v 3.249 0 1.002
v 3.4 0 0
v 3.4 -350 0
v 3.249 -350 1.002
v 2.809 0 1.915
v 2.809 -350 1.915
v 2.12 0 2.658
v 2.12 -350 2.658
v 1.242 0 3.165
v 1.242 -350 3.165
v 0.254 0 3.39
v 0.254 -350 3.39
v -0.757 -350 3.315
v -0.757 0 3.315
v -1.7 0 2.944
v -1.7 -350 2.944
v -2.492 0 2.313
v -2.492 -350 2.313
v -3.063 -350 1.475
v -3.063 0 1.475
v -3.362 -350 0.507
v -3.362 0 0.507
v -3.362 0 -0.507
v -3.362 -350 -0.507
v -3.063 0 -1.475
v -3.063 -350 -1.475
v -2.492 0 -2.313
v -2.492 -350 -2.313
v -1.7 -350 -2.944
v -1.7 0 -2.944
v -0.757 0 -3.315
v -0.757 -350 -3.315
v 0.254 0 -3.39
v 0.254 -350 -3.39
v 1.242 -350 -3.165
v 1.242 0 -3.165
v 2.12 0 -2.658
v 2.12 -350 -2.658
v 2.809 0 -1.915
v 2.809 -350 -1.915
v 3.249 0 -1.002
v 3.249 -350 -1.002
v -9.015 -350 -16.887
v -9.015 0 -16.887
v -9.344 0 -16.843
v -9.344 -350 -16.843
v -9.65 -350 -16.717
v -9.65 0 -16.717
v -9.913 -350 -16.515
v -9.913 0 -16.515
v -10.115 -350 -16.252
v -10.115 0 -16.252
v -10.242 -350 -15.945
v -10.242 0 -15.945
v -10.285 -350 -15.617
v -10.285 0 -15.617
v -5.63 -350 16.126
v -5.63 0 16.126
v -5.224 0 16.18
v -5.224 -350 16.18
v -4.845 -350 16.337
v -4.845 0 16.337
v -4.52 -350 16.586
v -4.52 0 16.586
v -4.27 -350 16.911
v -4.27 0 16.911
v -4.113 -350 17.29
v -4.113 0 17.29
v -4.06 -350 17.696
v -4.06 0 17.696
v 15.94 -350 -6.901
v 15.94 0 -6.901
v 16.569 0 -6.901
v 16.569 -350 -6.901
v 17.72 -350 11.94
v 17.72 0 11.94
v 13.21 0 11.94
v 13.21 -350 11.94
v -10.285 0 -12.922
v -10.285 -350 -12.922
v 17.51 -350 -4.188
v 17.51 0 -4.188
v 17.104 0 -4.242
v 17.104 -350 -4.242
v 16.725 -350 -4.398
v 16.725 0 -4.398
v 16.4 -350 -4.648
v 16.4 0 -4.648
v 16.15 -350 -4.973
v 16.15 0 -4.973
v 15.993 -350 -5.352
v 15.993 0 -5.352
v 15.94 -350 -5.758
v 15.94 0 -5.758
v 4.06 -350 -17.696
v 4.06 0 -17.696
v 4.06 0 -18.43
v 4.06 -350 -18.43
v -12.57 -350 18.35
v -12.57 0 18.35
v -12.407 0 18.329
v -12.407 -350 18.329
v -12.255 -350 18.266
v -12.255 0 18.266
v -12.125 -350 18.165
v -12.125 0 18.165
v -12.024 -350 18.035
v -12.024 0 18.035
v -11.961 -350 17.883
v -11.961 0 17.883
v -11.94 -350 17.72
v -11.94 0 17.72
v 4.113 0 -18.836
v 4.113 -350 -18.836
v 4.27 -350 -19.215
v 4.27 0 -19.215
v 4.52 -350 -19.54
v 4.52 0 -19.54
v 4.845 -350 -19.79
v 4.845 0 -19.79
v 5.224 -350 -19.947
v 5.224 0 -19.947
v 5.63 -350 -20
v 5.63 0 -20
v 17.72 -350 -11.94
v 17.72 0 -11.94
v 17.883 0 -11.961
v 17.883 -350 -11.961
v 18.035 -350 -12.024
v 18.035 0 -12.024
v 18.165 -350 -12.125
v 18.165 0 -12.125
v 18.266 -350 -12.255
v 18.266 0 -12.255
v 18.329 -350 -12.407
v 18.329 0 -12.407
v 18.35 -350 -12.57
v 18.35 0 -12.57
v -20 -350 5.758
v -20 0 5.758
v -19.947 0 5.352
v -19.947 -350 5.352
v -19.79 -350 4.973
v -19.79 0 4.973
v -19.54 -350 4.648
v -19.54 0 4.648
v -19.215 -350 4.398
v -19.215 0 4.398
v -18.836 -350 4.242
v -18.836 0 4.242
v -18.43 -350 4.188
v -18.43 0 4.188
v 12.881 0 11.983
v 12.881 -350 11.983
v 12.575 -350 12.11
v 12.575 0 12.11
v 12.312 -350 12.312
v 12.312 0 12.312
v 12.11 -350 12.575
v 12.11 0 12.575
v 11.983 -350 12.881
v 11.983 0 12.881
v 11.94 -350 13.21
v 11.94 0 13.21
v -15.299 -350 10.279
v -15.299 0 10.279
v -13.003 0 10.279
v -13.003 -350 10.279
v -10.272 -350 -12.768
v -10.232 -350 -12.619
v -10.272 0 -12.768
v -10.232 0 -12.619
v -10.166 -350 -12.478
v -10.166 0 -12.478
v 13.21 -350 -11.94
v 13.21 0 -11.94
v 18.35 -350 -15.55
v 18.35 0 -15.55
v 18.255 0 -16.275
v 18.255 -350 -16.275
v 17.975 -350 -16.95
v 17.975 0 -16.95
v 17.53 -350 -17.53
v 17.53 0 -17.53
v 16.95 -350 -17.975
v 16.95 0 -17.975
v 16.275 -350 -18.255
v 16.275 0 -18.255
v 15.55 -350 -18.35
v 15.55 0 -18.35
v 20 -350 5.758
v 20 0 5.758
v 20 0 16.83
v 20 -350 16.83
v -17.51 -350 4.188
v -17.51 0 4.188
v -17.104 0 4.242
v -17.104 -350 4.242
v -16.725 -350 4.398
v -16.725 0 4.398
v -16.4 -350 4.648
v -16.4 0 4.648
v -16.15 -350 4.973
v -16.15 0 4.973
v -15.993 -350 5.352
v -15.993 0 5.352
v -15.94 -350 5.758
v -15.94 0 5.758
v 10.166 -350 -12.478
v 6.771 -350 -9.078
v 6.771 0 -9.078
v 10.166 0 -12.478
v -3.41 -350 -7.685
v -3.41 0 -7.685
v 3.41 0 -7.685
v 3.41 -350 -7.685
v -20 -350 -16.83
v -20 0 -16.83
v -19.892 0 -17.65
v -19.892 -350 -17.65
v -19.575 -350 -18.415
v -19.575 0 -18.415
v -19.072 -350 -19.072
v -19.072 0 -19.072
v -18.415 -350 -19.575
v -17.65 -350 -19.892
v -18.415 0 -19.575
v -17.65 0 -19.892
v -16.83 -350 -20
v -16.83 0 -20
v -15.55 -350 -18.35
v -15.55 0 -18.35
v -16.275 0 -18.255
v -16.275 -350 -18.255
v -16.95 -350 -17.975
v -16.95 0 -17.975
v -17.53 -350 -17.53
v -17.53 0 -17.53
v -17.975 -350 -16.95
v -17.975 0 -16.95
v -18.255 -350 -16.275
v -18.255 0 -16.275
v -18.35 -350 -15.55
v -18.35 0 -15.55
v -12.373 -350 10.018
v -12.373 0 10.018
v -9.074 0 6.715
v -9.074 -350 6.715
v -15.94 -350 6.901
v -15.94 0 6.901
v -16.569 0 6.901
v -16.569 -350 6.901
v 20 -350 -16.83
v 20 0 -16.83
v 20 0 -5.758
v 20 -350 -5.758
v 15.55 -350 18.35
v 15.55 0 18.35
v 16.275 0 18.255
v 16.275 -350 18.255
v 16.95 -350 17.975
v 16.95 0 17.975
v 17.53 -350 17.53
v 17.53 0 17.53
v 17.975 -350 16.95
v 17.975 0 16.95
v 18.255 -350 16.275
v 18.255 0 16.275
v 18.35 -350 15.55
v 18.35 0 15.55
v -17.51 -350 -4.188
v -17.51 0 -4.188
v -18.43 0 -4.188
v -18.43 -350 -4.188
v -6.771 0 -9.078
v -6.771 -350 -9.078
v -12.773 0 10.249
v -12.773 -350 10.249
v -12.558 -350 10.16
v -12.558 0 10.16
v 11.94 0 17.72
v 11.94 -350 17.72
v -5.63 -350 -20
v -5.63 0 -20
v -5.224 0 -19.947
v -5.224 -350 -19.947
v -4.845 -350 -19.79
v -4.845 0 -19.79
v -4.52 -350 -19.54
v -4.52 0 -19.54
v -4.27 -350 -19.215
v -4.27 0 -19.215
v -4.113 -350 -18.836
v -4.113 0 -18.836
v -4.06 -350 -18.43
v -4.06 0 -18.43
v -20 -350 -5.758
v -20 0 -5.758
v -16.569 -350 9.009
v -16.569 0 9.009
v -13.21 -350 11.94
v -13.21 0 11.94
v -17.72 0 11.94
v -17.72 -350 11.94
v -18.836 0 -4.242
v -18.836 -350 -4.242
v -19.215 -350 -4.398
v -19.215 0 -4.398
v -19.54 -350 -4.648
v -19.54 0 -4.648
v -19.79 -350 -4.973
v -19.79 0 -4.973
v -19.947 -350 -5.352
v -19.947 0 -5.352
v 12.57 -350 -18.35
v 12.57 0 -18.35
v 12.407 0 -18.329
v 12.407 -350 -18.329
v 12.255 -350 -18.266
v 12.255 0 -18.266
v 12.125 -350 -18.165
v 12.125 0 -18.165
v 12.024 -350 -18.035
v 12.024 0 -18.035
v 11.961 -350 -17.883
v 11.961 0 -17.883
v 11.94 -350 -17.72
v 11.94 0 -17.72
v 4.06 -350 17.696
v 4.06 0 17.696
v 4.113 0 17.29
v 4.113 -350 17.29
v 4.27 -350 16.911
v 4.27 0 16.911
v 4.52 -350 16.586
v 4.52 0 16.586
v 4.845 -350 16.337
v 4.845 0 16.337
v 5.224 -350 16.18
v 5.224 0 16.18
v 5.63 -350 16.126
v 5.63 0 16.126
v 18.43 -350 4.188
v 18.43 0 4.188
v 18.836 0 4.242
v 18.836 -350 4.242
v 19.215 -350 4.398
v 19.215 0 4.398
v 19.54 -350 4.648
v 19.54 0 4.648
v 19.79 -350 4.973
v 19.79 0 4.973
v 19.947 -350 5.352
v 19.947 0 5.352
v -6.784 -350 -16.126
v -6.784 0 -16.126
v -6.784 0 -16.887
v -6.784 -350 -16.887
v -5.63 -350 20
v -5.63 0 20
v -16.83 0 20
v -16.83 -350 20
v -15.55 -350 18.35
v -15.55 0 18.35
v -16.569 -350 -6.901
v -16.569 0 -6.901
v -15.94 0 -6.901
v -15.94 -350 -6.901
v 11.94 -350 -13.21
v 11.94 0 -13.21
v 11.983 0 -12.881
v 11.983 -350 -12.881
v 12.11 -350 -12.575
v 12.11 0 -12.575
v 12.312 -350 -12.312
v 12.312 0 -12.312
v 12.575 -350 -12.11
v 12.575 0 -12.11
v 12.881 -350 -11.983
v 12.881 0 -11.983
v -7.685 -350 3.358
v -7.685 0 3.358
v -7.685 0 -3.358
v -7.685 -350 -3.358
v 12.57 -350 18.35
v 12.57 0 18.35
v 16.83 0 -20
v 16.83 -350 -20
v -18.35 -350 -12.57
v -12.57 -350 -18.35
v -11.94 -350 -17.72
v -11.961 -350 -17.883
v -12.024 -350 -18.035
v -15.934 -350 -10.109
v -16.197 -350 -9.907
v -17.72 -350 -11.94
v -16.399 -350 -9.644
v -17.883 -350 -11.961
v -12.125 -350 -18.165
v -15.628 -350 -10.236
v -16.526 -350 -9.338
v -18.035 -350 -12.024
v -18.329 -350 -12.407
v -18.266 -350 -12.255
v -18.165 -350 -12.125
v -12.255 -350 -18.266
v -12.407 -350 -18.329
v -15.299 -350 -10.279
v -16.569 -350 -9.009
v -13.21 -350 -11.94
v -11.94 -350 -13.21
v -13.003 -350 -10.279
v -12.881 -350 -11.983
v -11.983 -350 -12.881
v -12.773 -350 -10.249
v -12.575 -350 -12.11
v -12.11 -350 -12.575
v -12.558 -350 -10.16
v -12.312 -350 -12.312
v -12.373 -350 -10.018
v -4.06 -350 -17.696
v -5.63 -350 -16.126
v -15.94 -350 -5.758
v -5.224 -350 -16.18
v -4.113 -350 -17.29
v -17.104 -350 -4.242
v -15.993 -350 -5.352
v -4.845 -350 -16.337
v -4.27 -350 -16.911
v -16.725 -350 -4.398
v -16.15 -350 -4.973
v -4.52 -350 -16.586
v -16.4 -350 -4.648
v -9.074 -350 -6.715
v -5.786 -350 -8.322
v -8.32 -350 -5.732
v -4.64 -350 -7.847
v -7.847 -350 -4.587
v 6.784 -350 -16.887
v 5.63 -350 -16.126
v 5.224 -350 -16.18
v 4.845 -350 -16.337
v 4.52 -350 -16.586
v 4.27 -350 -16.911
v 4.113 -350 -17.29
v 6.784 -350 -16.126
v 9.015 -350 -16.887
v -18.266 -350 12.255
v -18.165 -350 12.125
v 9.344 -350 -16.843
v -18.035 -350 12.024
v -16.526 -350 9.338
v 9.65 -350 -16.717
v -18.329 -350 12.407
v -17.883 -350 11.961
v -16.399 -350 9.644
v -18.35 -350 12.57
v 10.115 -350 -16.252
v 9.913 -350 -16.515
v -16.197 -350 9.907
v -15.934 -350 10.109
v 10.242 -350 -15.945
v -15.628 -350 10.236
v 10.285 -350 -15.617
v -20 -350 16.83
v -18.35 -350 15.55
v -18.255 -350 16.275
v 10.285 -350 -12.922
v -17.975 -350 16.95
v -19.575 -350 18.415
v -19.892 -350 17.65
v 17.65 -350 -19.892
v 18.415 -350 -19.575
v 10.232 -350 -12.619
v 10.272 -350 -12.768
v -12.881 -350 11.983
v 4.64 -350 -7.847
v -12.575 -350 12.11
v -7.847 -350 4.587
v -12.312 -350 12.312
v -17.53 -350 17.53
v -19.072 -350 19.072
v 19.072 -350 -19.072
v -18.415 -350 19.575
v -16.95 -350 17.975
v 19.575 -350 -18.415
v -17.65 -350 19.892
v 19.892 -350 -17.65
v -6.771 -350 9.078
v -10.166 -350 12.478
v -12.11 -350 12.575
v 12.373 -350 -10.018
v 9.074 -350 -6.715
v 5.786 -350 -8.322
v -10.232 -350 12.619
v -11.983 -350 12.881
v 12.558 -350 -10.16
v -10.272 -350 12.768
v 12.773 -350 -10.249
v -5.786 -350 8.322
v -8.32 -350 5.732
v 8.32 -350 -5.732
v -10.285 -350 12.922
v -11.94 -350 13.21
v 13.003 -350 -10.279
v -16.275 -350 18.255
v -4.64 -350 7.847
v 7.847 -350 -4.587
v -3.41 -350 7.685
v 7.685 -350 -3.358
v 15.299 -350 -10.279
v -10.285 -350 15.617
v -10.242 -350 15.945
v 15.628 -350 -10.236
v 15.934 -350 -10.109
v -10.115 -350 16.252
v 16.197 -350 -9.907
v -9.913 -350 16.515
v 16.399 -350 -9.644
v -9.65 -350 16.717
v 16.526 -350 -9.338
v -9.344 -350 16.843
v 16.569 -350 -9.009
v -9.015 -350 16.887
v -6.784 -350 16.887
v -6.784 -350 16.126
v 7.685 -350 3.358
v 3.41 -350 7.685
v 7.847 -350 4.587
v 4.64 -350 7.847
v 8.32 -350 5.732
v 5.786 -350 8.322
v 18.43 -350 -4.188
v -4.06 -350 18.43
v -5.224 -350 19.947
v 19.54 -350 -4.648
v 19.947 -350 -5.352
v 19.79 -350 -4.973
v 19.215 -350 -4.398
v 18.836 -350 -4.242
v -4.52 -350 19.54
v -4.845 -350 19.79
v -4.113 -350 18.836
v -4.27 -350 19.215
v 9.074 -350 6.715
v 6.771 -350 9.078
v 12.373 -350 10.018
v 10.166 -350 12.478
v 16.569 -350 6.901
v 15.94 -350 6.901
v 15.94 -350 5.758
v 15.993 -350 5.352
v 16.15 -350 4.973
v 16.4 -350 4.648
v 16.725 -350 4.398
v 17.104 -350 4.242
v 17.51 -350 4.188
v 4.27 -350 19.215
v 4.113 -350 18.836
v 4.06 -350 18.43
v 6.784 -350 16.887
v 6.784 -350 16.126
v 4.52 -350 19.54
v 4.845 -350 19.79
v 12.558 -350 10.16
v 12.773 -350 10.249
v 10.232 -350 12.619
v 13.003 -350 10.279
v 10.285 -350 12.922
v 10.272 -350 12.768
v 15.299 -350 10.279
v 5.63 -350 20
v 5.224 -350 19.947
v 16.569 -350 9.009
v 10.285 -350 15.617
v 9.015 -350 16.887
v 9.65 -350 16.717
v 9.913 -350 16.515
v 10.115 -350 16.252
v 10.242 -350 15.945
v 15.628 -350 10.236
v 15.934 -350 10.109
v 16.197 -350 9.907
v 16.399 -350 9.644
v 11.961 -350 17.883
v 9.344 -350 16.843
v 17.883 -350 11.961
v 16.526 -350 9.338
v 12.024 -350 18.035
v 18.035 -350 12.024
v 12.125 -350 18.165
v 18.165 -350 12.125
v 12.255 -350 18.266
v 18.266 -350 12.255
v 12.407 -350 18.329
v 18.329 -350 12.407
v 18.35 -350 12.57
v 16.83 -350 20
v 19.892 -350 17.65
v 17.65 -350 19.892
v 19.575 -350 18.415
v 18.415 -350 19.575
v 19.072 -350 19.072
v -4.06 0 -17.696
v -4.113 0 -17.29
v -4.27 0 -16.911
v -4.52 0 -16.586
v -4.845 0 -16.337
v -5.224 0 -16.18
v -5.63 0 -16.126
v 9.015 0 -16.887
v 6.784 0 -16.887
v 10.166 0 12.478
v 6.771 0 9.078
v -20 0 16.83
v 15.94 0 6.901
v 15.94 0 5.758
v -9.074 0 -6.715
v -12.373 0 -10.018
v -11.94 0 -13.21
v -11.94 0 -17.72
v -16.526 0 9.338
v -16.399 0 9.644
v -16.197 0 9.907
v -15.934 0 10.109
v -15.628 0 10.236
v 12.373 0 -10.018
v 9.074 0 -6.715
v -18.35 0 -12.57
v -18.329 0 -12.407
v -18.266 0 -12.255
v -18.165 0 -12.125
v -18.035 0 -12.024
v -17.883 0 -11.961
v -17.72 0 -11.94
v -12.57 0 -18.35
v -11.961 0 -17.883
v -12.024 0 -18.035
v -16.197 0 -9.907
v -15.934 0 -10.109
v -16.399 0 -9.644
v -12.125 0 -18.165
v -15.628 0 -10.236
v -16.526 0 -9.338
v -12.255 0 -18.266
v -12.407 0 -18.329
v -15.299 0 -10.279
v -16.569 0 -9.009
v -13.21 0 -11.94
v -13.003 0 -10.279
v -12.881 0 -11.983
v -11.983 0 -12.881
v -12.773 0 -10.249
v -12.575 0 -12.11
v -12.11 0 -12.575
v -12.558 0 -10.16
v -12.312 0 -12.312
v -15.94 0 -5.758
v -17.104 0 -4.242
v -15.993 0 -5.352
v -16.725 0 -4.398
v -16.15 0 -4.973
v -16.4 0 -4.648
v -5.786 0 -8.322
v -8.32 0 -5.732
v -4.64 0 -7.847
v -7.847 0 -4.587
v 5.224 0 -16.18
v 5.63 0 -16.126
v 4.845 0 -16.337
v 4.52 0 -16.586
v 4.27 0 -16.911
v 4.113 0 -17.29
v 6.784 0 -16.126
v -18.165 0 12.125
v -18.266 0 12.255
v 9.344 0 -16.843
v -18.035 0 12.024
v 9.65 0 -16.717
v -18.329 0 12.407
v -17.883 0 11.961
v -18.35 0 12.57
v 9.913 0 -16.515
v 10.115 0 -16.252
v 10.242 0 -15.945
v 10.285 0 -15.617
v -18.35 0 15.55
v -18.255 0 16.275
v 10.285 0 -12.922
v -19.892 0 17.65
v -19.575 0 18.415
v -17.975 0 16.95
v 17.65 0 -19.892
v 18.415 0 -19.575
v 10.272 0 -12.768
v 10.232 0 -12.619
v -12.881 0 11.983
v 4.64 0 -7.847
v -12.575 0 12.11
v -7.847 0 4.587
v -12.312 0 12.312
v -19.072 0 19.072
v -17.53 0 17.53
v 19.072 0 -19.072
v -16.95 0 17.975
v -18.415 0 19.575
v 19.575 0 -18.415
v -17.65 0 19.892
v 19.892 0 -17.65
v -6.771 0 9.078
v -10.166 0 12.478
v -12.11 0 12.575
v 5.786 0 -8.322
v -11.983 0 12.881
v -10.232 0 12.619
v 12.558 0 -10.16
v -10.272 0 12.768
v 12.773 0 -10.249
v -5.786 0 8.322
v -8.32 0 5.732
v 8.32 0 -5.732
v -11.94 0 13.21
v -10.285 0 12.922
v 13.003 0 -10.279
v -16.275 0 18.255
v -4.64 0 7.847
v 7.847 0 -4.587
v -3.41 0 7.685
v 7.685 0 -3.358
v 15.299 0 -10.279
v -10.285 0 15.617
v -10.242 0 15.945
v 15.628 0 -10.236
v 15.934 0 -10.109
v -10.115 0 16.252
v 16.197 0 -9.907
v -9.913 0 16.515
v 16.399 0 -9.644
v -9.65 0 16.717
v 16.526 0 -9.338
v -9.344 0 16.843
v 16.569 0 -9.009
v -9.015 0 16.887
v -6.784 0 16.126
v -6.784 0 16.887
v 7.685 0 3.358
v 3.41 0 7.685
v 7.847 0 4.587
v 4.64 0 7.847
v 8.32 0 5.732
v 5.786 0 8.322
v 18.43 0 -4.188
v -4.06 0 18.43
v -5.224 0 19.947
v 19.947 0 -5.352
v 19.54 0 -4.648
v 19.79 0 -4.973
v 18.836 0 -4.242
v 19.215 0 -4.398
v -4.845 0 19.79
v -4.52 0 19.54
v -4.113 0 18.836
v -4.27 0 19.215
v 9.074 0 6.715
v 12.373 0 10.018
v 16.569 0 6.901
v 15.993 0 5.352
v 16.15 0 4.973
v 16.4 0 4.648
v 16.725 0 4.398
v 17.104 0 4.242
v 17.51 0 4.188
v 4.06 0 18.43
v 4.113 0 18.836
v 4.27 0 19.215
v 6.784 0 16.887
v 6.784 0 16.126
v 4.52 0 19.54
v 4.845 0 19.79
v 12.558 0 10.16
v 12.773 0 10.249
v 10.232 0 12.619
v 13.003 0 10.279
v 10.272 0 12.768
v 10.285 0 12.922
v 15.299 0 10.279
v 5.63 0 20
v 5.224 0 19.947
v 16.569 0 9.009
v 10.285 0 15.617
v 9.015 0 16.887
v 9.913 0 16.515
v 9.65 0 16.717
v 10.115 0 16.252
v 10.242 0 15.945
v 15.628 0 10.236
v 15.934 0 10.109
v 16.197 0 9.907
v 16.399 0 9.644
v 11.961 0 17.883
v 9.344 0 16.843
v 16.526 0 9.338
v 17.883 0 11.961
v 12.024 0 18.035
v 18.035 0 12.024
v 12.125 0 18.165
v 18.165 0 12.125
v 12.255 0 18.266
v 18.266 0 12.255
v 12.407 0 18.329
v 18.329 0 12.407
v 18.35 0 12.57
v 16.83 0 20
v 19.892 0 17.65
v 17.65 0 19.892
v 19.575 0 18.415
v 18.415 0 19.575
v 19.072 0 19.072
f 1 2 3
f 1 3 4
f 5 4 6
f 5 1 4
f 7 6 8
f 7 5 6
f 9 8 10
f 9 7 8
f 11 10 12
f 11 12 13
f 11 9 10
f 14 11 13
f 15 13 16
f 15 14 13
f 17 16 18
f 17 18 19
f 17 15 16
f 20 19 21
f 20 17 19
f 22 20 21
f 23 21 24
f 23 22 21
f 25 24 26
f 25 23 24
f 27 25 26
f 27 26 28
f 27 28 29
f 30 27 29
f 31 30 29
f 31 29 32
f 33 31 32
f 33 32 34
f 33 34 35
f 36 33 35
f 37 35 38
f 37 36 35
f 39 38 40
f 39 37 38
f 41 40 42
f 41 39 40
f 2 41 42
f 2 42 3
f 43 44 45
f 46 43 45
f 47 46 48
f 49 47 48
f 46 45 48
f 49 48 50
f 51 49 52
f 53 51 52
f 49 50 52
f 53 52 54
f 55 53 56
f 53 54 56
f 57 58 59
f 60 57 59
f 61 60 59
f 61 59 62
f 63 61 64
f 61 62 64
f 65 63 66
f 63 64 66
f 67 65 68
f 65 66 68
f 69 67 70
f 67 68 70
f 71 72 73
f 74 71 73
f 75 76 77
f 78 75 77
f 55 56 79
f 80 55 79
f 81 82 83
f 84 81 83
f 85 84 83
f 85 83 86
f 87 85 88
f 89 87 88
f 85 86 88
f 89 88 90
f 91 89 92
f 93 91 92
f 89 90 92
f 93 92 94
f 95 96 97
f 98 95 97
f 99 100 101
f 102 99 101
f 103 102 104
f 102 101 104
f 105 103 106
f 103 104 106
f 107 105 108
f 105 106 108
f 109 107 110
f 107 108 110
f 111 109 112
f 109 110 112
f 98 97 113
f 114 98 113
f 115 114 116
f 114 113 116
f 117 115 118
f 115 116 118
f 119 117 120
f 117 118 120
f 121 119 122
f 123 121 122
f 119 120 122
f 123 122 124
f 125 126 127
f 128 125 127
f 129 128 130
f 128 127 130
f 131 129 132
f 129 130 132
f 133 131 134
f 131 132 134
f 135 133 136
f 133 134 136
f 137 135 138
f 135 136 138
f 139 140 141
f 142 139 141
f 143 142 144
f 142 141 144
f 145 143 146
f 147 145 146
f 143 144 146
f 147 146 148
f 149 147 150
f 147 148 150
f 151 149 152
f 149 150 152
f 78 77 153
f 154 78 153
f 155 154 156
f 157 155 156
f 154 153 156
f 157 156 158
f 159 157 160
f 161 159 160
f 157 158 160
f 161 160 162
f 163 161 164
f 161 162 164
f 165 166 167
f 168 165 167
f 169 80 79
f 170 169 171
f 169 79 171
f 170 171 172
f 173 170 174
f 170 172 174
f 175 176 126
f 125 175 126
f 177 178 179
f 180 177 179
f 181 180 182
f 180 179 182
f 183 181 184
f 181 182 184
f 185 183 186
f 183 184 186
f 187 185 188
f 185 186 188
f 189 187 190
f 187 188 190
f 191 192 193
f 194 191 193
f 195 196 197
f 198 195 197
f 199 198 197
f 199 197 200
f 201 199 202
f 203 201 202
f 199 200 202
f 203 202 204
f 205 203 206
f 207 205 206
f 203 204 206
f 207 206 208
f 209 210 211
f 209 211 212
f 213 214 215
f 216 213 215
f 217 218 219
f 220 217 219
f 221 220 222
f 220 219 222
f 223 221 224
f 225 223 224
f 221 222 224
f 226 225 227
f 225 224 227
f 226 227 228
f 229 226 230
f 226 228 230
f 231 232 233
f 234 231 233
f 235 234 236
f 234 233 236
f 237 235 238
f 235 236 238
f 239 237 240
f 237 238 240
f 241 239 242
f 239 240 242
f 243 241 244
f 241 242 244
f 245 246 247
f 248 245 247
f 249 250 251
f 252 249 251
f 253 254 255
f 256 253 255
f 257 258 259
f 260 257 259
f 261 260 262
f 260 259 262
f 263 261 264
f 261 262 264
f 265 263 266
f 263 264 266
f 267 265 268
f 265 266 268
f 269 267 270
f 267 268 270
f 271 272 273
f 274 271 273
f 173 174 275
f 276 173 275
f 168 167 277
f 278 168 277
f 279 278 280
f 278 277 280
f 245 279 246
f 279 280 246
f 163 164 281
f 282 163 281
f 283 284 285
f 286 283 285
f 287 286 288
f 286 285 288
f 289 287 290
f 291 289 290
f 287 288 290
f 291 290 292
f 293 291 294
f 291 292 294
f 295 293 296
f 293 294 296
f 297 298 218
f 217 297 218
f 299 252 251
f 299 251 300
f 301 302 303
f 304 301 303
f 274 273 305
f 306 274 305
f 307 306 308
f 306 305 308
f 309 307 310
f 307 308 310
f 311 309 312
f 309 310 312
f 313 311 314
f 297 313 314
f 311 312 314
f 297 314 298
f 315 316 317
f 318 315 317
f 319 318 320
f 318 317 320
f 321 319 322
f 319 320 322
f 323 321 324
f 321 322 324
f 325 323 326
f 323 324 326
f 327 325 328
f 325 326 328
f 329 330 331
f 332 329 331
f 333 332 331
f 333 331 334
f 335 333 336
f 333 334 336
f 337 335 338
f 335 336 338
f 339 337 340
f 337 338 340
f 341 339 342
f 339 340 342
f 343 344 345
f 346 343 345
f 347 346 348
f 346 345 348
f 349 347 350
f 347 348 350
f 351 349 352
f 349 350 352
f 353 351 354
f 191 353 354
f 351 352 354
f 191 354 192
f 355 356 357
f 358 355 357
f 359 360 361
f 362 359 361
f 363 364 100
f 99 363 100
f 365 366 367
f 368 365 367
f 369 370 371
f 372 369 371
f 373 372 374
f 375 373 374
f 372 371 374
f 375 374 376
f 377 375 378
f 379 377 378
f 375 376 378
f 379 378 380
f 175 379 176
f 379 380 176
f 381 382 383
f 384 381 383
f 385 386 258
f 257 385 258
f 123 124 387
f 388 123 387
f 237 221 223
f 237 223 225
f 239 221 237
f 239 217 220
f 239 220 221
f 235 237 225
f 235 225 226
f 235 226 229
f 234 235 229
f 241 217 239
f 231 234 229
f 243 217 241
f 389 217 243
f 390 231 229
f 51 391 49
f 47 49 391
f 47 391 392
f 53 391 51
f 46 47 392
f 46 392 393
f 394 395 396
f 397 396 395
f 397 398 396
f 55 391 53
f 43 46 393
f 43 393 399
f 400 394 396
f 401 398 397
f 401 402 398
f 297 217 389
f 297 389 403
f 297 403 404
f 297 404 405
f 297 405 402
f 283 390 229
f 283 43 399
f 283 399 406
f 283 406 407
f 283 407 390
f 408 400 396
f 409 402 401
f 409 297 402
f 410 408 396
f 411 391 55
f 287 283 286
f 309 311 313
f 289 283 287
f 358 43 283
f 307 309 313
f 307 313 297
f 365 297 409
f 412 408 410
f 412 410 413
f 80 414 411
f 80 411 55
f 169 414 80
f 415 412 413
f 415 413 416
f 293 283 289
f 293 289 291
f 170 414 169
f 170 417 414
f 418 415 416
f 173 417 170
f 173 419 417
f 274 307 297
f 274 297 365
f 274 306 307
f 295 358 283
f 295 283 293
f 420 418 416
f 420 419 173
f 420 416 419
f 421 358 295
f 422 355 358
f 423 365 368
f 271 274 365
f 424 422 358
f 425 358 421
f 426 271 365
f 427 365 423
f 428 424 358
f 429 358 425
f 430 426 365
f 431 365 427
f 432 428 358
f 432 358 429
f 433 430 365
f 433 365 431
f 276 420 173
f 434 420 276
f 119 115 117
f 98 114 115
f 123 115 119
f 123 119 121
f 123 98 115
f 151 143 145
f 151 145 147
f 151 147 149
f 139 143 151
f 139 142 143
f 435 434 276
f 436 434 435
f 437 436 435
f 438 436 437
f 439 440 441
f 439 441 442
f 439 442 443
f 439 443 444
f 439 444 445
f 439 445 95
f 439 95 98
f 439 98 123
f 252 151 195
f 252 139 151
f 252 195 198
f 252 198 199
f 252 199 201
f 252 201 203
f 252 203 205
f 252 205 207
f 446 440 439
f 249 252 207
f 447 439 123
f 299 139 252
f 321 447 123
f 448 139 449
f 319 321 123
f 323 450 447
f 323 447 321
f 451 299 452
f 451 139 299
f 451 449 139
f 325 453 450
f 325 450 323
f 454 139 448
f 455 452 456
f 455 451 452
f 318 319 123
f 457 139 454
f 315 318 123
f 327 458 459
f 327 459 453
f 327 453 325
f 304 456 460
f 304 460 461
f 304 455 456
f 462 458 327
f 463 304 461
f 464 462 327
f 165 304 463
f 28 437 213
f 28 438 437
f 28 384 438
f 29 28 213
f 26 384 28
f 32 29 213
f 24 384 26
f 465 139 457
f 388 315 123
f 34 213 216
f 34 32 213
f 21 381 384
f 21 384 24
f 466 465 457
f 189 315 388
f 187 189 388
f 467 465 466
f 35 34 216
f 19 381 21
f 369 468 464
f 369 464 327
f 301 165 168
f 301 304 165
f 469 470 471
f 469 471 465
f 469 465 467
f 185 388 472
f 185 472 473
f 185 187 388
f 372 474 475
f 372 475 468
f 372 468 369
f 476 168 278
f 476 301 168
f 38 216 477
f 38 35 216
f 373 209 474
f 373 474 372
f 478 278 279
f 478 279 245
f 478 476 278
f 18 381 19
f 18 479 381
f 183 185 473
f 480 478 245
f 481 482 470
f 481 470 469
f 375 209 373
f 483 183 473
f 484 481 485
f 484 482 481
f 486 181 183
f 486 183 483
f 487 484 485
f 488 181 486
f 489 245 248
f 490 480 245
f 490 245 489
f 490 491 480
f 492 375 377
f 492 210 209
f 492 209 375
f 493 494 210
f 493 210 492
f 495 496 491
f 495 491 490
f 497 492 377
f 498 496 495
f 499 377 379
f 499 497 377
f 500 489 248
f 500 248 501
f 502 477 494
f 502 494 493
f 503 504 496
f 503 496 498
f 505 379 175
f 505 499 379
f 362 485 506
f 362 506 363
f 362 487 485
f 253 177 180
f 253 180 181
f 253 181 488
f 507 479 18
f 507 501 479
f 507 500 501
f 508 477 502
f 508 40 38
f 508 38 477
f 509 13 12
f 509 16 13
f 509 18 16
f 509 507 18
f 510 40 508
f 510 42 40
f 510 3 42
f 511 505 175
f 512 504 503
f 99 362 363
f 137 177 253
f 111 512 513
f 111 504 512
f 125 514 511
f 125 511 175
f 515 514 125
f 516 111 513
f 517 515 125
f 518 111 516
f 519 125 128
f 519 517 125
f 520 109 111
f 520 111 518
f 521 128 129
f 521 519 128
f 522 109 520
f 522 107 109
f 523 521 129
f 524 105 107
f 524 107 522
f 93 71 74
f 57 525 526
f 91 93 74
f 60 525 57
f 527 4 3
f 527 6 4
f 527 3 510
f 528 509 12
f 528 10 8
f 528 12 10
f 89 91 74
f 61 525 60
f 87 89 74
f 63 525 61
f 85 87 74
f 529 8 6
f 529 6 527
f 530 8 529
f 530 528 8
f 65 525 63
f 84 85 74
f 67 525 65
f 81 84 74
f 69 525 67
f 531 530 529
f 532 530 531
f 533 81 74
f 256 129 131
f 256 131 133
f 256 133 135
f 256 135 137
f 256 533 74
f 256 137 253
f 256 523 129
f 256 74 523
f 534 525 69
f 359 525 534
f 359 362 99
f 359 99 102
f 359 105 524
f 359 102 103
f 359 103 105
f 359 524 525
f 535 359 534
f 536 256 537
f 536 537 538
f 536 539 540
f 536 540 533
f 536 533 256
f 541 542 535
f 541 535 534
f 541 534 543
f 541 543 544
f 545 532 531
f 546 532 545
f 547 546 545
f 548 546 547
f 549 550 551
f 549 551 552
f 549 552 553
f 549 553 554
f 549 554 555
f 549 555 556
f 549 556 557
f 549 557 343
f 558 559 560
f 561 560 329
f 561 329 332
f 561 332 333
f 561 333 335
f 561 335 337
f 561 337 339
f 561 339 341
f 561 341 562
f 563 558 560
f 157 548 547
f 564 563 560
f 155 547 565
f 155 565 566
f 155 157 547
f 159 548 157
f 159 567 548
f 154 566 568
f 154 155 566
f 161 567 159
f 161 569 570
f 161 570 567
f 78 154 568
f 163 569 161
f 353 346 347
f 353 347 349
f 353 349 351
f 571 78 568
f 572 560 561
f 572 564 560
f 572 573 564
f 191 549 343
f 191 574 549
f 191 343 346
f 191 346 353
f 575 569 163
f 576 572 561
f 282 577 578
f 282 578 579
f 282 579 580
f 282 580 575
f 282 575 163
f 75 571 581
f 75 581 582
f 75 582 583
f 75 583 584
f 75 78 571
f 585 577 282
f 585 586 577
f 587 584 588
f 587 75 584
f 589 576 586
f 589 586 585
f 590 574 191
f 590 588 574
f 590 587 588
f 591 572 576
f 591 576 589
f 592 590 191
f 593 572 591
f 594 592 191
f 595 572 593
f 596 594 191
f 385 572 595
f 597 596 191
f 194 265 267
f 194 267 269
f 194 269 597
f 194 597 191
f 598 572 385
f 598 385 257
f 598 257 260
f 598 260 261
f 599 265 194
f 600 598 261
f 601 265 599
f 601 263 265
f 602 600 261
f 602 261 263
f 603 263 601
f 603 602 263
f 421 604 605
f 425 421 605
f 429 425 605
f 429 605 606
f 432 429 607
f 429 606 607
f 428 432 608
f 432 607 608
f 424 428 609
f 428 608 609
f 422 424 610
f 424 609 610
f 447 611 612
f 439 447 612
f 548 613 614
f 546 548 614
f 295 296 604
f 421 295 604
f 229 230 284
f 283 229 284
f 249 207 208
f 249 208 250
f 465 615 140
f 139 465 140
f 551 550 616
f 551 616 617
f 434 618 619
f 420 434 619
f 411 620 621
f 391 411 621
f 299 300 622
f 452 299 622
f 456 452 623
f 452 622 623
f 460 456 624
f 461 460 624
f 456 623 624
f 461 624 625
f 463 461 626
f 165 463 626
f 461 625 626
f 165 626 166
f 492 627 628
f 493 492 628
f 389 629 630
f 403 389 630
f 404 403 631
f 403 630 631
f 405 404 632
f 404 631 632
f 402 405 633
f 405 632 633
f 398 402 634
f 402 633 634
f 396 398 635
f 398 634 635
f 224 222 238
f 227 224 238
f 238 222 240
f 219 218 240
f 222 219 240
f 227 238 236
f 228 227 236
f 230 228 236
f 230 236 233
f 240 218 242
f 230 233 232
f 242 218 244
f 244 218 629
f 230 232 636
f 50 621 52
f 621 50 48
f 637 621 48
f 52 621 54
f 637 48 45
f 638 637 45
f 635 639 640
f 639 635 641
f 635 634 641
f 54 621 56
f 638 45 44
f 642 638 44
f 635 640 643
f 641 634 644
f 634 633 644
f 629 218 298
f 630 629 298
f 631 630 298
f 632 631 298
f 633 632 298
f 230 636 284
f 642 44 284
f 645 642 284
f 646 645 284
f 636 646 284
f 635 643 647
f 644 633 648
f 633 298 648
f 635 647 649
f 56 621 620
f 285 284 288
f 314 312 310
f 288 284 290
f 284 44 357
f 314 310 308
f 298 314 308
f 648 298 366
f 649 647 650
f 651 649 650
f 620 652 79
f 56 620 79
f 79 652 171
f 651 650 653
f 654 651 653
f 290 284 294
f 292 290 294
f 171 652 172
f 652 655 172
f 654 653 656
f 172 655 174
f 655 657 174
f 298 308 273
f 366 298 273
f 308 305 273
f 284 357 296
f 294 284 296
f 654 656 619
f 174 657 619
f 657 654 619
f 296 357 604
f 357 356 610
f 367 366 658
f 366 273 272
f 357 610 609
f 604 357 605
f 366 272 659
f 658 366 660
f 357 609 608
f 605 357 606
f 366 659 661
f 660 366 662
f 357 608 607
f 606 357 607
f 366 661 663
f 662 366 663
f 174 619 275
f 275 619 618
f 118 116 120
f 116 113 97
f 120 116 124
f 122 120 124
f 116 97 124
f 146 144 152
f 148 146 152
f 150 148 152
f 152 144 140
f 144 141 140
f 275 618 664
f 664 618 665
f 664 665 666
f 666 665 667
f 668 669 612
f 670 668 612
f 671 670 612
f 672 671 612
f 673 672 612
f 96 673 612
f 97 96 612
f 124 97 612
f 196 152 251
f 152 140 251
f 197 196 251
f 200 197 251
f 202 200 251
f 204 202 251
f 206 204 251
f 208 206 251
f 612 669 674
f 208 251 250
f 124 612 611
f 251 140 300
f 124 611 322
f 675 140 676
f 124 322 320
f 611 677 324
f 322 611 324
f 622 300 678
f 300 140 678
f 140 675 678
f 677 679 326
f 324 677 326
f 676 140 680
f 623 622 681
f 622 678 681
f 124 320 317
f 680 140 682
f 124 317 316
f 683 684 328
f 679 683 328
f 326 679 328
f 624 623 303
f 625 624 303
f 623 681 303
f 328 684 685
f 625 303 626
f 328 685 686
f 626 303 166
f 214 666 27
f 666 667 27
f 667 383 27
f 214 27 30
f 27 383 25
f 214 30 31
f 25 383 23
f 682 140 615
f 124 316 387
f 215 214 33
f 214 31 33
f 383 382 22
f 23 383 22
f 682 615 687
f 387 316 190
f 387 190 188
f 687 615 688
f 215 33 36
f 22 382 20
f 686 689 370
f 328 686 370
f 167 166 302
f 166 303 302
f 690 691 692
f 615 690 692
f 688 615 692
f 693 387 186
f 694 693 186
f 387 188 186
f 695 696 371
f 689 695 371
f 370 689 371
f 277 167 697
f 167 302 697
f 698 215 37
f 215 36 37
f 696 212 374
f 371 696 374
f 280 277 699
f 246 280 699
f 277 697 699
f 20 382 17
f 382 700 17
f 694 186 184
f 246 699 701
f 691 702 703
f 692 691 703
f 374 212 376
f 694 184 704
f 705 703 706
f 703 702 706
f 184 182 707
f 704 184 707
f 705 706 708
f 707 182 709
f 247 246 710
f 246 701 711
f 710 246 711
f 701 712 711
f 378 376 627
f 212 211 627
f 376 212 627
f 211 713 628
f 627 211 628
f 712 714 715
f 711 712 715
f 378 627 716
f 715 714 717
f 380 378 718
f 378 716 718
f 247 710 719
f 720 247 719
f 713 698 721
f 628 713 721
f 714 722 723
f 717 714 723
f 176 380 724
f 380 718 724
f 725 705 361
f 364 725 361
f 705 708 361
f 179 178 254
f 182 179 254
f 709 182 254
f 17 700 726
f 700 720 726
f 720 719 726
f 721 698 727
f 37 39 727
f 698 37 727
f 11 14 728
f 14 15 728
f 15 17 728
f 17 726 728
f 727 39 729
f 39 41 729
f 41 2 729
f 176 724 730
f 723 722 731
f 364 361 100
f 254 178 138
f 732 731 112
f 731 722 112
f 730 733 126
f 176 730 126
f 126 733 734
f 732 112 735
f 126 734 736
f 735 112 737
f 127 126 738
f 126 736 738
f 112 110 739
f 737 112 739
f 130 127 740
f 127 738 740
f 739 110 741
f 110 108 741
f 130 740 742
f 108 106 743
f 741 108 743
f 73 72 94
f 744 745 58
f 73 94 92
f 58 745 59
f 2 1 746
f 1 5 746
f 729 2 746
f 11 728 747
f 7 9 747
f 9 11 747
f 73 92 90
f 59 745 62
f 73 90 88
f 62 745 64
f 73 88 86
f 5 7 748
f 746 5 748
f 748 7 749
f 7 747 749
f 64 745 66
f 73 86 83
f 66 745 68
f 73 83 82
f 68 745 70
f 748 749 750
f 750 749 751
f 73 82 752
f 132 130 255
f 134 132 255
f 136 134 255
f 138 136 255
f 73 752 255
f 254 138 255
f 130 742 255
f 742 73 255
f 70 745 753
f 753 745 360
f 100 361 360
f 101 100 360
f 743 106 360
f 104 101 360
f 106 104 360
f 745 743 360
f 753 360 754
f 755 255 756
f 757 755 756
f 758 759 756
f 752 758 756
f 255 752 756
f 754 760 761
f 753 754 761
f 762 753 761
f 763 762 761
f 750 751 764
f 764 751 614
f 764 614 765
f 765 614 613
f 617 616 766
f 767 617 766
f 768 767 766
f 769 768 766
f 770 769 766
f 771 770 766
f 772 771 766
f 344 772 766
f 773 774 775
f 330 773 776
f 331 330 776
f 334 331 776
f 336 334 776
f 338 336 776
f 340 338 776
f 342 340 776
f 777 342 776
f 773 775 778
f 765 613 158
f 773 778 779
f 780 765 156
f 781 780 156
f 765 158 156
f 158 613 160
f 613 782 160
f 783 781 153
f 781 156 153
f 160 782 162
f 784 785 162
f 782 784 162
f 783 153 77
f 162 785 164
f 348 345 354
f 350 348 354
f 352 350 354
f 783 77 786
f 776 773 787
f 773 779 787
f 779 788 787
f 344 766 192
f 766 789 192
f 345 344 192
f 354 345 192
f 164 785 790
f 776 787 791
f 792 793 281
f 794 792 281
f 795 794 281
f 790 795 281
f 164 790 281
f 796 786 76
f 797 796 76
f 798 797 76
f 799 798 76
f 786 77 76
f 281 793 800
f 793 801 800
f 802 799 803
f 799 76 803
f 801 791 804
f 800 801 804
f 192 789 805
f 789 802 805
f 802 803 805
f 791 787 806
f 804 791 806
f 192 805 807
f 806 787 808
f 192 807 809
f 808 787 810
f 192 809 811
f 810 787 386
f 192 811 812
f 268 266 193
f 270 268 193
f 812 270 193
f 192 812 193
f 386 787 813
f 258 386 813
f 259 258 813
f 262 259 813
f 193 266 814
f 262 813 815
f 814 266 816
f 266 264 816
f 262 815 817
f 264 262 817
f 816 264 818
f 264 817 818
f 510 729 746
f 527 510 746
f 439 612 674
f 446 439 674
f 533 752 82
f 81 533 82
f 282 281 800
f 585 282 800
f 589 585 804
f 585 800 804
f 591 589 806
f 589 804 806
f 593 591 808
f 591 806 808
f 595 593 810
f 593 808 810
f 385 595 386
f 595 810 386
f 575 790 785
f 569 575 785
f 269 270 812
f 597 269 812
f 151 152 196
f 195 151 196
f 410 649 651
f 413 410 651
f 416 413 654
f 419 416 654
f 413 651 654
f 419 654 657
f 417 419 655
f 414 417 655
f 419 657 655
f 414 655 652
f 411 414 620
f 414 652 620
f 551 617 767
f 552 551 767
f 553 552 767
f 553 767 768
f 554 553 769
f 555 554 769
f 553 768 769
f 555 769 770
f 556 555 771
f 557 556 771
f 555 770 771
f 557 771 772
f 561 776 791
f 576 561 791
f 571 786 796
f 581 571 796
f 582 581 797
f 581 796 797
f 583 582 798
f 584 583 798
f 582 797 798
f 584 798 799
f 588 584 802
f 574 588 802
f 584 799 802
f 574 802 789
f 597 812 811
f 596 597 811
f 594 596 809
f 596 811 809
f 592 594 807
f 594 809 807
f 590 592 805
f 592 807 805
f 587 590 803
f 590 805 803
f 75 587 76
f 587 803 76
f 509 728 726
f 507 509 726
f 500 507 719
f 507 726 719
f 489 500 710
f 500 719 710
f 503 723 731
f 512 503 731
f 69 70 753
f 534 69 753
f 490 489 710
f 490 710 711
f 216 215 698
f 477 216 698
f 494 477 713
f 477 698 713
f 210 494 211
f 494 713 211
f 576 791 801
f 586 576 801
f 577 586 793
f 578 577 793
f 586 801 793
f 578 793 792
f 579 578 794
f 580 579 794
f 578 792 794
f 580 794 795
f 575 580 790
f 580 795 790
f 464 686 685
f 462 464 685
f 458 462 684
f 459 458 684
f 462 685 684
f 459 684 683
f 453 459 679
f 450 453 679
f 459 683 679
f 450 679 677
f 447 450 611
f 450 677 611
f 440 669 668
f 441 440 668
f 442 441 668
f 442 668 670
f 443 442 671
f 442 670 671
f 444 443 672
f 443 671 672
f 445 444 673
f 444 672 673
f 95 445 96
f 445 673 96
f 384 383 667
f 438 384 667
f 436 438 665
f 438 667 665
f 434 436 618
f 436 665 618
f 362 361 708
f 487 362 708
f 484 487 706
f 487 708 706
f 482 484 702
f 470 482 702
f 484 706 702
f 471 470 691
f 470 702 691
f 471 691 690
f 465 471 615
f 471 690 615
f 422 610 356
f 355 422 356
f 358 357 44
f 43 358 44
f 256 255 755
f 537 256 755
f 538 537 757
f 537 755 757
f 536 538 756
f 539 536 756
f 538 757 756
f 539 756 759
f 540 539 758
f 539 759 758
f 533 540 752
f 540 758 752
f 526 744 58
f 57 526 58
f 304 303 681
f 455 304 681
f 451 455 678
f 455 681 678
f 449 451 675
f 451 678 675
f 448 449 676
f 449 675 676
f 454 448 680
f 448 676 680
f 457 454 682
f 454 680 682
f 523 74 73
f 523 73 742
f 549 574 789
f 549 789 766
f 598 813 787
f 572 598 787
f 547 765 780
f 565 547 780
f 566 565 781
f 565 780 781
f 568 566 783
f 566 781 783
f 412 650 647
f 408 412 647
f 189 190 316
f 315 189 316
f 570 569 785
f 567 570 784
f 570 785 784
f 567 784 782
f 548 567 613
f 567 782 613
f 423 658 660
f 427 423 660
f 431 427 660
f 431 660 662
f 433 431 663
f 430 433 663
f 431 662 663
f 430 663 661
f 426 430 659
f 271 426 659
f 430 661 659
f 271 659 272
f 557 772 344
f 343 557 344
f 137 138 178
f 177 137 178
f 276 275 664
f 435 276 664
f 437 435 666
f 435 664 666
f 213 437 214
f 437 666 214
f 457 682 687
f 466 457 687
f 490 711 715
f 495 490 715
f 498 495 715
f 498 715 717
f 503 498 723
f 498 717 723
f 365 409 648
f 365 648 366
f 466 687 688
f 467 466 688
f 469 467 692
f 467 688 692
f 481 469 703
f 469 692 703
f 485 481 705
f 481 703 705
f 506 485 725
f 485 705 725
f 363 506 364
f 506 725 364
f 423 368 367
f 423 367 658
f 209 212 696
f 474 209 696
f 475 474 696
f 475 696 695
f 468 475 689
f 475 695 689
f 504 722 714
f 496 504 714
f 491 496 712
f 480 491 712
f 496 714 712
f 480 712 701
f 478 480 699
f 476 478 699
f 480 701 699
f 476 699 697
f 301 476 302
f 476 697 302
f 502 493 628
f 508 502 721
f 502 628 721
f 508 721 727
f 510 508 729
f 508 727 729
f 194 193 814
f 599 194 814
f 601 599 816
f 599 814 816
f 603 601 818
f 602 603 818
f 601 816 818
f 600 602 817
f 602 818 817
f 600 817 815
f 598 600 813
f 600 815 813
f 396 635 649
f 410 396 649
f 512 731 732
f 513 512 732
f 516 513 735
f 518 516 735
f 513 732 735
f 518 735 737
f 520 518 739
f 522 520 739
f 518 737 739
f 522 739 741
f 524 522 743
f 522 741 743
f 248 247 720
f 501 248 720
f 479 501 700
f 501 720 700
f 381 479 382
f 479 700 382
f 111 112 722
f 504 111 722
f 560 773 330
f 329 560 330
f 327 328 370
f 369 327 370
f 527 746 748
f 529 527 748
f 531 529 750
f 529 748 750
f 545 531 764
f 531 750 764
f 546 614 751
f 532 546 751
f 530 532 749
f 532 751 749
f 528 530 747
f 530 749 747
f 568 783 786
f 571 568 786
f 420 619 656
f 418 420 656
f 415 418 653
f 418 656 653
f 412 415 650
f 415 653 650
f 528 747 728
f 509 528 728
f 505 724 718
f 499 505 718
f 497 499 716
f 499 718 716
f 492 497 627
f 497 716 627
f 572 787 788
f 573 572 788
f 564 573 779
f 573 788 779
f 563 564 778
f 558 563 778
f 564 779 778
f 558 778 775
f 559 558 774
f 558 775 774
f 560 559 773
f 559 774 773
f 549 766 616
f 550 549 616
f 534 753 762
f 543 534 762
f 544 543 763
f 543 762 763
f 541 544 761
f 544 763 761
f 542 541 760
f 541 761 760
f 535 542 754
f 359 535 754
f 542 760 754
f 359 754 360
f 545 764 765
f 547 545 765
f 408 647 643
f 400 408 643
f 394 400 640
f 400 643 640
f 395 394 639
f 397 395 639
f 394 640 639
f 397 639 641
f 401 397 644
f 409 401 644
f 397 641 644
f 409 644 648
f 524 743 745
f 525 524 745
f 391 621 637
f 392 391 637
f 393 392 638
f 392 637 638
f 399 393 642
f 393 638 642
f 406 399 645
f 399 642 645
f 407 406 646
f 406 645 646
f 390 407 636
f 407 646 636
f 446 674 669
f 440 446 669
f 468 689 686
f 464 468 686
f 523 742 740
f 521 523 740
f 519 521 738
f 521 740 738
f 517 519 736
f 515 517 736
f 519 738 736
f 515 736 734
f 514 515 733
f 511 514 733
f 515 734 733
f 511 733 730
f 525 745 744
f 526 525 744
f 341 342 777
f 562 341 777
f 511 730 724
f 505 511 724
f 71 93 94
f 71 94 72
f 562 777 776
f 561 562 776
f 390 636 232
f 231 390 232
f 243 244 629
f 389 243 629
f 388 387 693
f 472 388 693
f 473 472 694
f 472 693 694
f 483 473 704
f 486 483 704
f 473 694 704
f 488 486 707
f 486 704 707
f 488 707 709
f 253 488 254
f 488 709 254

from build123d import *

# Parameters (mm, degrees)
F0_R     = 3.4
F1_DEPTH = 350


# Not quite as in the source:
# - ends of sketch curves that miss each other by under 0.0002 mm in the source are joined


with BuildPart() as f1:
    # F0 (on Front) → F1 (new body)
    with BuildSketch(Plane.XZ):
        with BuildLine():
            ThreePointArc((9.0741494418, -6.7149045575), (8.0460058013, -5.1746202437), (7.685, -3.358242))
            Line((7.685, -3.358242), (7.685, 3.358242))
            ThreePointArc((7.685, 3.358242), (8.0460058013, 5.1746202437), (9.0741494418, 6.7149045575))
            Line((9.0741494418, 6.7149045575), (12.373455, 10.018326))
            ThreePointArc((12.373455, 10.018326), (12.6623276754, 10.2115396696), (13.003172, 10.279393))
            Line((13.003172, 10.279393), (15.29885, 10.279393))
            ThreePointArc((15.29885, 10.279393), (16.1968756121, 9.9074186121), (16.56885, 9.009393))
            Line((16.56885, 9.009393), (16.56885, 6.901426))
            Line((16.56885, 6.901426), (15.94, 6.901426))
            Line((15.94, 6.901426), (15.94, 5.758104))
            ThreePointArc((15.94, 5.758104), (16.3998423535, 4.6479463535), (17.51, 4.188104))
            Line((17.51, 4.188104), (18.43, 4.188104))
            ThreePointArc((18.43, 4.188104), (19.5401576465, 4.6479463535), (20, 5.758104))
            Line((20, 5.758104), (20, 16.83))
            ThreePointArc((20, 16.83), (19.0715284964, 19.0715284964), (16.83, 20))
            Line((16.83, 20), (5.63, 20))
            ThreePointArc((5.63, 20), (4.5198423535, 19.5401576465), (4.06, 18.43))
            Line((4.06, 18.43), (4.06, 17.696221))
            ThreePointArc((4.06, 17.696221), (4.5198423535, 16.5860633535), (5.63, 16.126221))
            Line((5.63, 16.126221), (6.783928, 16.126221))
            Line((6.783928, 16.126221), (6.783928, 16.886684))
            Line((6.783928, 16.886684), (9.015, 16.886684))
            ThreePointArc((9.015, 16.886684), (9.9130256121, 16.5147096121), (10.285, 15.616684))
            Line((10.285, 15.616684), (10.285, 12.922194))
            ThreePointArc((10.285, 12.922194), (10.2548511553, 12.6925072769), (10.1664472118, 12.4783818782))
            Line((10.1664472118, 12.4783818782), (6.770639, 9.078337))
            ThreePointArc((6.770639, 9.078337), (5.2289028603, 8.0471389307), (3.409789, 7.685))
            Line((3.409789, 7.685), (-3.409789, 7.685))
            ThreePointArc((-3.409789, 7.685), (-5.2289028603, 8.0471389307), (-6.7706390582, 9.0783369418))
            Line((-6.7706390582, 9.0783369418), (-10.166447, 12.478382))
            ThreePointArc((-10.166447, 12.478382), (-10.2548511553, 12.6925072769), (-10.285, 12.922194))
            Line((-10.285, 12.922194), (-10.285, 15.616684))
            ThreePointArc((-10.285, 15.616684), (-9.9130256121, 16.5147096121), (-9.015, 16.886684))
            Line((-9.015, 16.886684), (-6.783928, 16.886684))
            Line((-6.783928, 16.886684), (-6.783928, 16.126221))
            Line((-6.783928, 16.126221), (-5.63, 16.126221))
            ThreePointArc((-5.63, 16.126221), (-4.5198423535, 16.5860633535), (-4.06, 17.696221))
            Line((-4.06, 17.696221), (-4.06, 18.43))
            ThreePointArc((-4.06, 18.43), (-4.5198423535, 19.5401576465), (-5.63, 20))
            Line((-5.63, 20), (-16.83, 20))
            ThreePointArc((-16.83, 20), (-19.0715284964, 19.0715284964), (-20, 16.83))
            Line((-20, 16.83), (-20, 5.758104))
            ThreePointArc((-20, 5.758104), (-19.5401576465, 4.6479463535), (-18.43, 4.188104))
            Line((-18.43, 4.188104), (-17.51, 4.188104))
            ThreePointArc((-17.51, 4.188104), (-16.3998423535, 4.6479463535), (-15.94, 5.758104))
            Line((-15.94, 5.758104), (-15.94, 6.901426))
            Line((-15.94, 6.901426), (-16.56885, 6.901426))
            Line((-16.56885, 6.901426), (-16.56885, 9.009393))
            ThreePointArc((-16.56885, 9.009393), (-16.1968756121, 9.9074186121), (-15.29885, 10.279393))
            Line((-15.29885, 10.279393), (-13.003172, 10.279393))
            ThreePointArc((-13.003172, 10.279393), (-12.6623276754, 10.2115396696), (-12.3734550869, 10.0183259132))
            Line((-12.3734550869, 10.0183259132), (-9.07415, 6.714904))
            ThreePointArc((-9.07415, 6.714904), (-8.0460058013, 5.1746202437), (-7.685, 3.358242))
            Line((-7.685, 3.358242), (-7.685, -3.358242))
            ThreePointArc((-7.685, -3.358242), (-8.0460058013, -5.1746202437), (-9.0741494418, -6.7149045575))
            Line((-9.0741494418, -6.7149045575), (-12.373455, -10.018326))
            ThreePointArc((-12.373455, -10.018326), (-12.6623276754, -10.2115396696), (-13.003172, -10.279393))
            Line((-13.003172, -10.279393), (-15.29885, -10.279393))
            ThreePointArc((-15.29885, -10.279393), (-16.1968756121, -9.9074186121), (-16.56885, -9.009393))
            Line((-16.56885, -9.009393), (-16.56885, -6.901426))
            Line((-16.56885, -6.901426), (-15.94, -6.901426))
            Line((-15.94, -6.901426), (-15.94, -5.758104))
            ThreePointArc((-15.94, -5.758104), (-16.3998423535, -4.6479463535), (-17.51, -4.188104))
            Line((-17.51, -4.188104), (-18.43, -4.188104))
            ThreePointArc((-18.43, -4.188104), (-19.5401576465, -4.6479463535), (-20, -5.758104))
            Line((-20, -5.758104), (-20, -16.83))
            ThreePointArc((-20, -16.83), (-19.0715284964, -19.0715284964), (-16.83, -20))
            Line((-16.83, -20), (-5.63, -20))
            ThreePointArc((-5.63, -20), (-4.5198423535, -19.5401576465), (-4.06, -18.43))
            Line((-4.06, -18.43), (-4.06, -17.696221))
            ThreePointArc((-4.06, -17.696221), (-4.5198423535, -16.5860633535), (-5.63, -16.126221))
            Line((-5.63, -16.126221), (-6.783928, -16.126221))
            Line((-6.783928, -16.126221), (-6.783928, -16.886684))
            Line((-6.783928, -16.886684), (-9.015, -16.886684))
            ThreePointArc((-9.015, -16.886684), (-9.9130256121, -16.5147096121), (-10.285, -15.616684))
            Line((-10.285, -15.616684), (-10.285, -12.922194))
            ThreePointArc((-10.285, -12.922194), (-10.2548511553, -12.6925072769), (-10.1664472118, -12.4783818782))
            Line((-10.1664472118, -12.4783818782), (-6.770639, -9.078337))
            ThreePointArc((-6.770639, -9.078337), (-5.2289028603, -8.0471389307), (-3.409789, -7.685))
            Line((-3.409789, -7.685), (3.409789, -7.685))
            ThreePointArc((3.409789, -7.685), (5.2289028603, -8.0471389307), (6.7706390582, -9.0783369418))
            Line((6.7706390582, -9.0783369418), (10.166447, -12.478382))
            ThreePointArc((10.166447, -12.478382), (10.2548511553, -12.6925072769), (10.285, -12.922194))
            Line((10.285, -12.922194), (10.285, -15.616684))
            ThreePointArc((10.285, -15.616684), (9.9130256121, -16.5147096121), (9.015, -16.886684))
            Line((9.015, -16.886684), (6.783928, -16.886684))
            Line((6.783928, -16.886684), (6.783928, -16.126221))
            Line((6.783928, -16.126221), (5.63, -16.126221))
            ThreePointArc((5.63, -16.126221), (4.5198423535, -16.5860633535), (4.06, -17.696221))
            Line((4.06, -17.696221), (4.06, -18.43))
            ThreePointArc((4.06, -18.43), (4.5198423535, -19.5401576465), (5.63, -20))
            Line((5.63, -20), (16.83, -20))
            ThreePointArc((16.83, -20), (19.0715284964, -19.0715284964), (20, -16.83))
            Line((20, -16.83), (20, -5.758104))
            ThreePointArc((20, -5.758104), (19.5401576465, -4.6479463535), (18.43, -4.188104))
            Line((18.43, -4.188104), (17.51, -4.188104))
            ThreePointArc((17.51, -4.188104), (16.3998423535, -4.6479463535), (15.94, -5.758104))
            Line((15.94, -5.758104), (15.94, -6.901426))
            Line((15.94, -6.901426), (16.56885, -6.901426))
            Line((16.56885, -6.901426), (16.56885, -9.009393))
            ThreePointArc((16.56885, -9.009393), (16.1968756121, -9.9074186121), (15.29885, -10.279393))
            Line((15.29885, -10.279393), (13.003172, -10.279393))
            ThreePointArc((13.003172, -10.279393), (12.6623276754, -10.2115396696), (12.3734550869, -10.0183259132))
            Line((12.3734550869, -10.0183259132), (9.0741494418, -6.7149045575))
        make_face()
        with BuildLine():
            Line((-12.57, -18.35), (-15.55, -18.35))
            ThreePointArc((-15.55, -18.35), (-17.5298989873, -17.5298989873), (-18.35, -15.55))
            Line((-18.35, -15.55), (-18.35, -12.57))
            ThreePointArc((-18.35, -12.57), (-18.1654772721, -12.1245227279), (-17.72, -11.94))
            Line((-17.72, -11.94), (-13.21, -11.94))
            ThreePointArc((-13.21, -11.94), (-12.3119743879, -12.3119743879), (-11.94, -13.21))
            Line((-11.94, -13.21), (-11.94, -17.72))
            ThreePointArc((-11.94, -17.72), (-12.1245227279, -18.1654772721), (-12.57, -18.35))
        make_face(mode=Mode.SUBTRACT)
        with BuildLine():
            Line((13.21, -11.94), (17.72, -11.94))
            ThreePointArc((17.72, -11.94), (18.1654772721, -12.1245227279), (18.35, -12.57))
            Line((18.35, -12.57), (18.35, -15.55))
            ThreePointArc((18.35, -15.55), (17.5298989873, -17.5298989873), (15.55, -18.35))
            Line((15.55, -18.35), (12.57, -18.35))
            ThreePointArc((12.57, -18.35), (12.1245227279, -18.1654772721), (11.94, -17.72))
            Line((11.94, -17.72), (11.94, -13.21))
            ThreePointArc((11.94, -13.21), (12.3119743879, -12.3119743879), (13.21, -11.94))
        make_face(mode=Mode.SUBTRACT)
        with BuildLine():
            ThreePointArc((-17.72, 11.94), (-18.1654772721, 12.1245227279), (-18.35, 12.57))
            Line((-18.35, 12.57), (-18.35, 15.55))
            ThreePointArc((-18.35, 15.55), (-17.5298989873, 17.5298989873), (-15.55, 18.35))
            Line((-15.55, 18.35), (-12.57, 18.35))
            ThreePointArc((-12.57, 18.35), (-12.1245227279, 18.1654772721), (-11.94, 17.72))
            Line((-11.94, 17.72), (-11.94, 13.21))
            ThreePointArc((-11.94, 13.21), (-12.3119743879, 12.3119743879), (-13.21, 11.94))
            Line((-13.21, 11.94), (-17.72, 11.94))
        make_face(mode=Mode.SUBTRACT)
        Circle(F0_R, mode=Mode.SUBTRACT)
        with BuildLine():
            Line((12.57, 18.35), (15.55, 18.35))
            ThreePointArc((15.55, 18.35), (17.5298989873, 17.5298989873), (18.35, 15.55))
            Line((18.35, 15.55), (18.35, 12.57))
            ThreePointArc((18.35, 12.57), (18.1654772721, 12.1245227279), (17.72, 11.94))
            Line((17.72, 11.94), (13.21, 11.94))
            ThreePointArc((13.21, 11.94), (12.3119743879, 12.3119743879), (11.94, 13.21))
            Line((11.94, 13.21), (11.94, 17.72))
            ThreePointArc((11.94, 17.72), (12.1245227279, 18.1654772721), (12.57, 18.35))
        make_face(mode=Mode.SUBTRACT)
    extrude(amount=F1_DEPTH)


solid = f1.part
